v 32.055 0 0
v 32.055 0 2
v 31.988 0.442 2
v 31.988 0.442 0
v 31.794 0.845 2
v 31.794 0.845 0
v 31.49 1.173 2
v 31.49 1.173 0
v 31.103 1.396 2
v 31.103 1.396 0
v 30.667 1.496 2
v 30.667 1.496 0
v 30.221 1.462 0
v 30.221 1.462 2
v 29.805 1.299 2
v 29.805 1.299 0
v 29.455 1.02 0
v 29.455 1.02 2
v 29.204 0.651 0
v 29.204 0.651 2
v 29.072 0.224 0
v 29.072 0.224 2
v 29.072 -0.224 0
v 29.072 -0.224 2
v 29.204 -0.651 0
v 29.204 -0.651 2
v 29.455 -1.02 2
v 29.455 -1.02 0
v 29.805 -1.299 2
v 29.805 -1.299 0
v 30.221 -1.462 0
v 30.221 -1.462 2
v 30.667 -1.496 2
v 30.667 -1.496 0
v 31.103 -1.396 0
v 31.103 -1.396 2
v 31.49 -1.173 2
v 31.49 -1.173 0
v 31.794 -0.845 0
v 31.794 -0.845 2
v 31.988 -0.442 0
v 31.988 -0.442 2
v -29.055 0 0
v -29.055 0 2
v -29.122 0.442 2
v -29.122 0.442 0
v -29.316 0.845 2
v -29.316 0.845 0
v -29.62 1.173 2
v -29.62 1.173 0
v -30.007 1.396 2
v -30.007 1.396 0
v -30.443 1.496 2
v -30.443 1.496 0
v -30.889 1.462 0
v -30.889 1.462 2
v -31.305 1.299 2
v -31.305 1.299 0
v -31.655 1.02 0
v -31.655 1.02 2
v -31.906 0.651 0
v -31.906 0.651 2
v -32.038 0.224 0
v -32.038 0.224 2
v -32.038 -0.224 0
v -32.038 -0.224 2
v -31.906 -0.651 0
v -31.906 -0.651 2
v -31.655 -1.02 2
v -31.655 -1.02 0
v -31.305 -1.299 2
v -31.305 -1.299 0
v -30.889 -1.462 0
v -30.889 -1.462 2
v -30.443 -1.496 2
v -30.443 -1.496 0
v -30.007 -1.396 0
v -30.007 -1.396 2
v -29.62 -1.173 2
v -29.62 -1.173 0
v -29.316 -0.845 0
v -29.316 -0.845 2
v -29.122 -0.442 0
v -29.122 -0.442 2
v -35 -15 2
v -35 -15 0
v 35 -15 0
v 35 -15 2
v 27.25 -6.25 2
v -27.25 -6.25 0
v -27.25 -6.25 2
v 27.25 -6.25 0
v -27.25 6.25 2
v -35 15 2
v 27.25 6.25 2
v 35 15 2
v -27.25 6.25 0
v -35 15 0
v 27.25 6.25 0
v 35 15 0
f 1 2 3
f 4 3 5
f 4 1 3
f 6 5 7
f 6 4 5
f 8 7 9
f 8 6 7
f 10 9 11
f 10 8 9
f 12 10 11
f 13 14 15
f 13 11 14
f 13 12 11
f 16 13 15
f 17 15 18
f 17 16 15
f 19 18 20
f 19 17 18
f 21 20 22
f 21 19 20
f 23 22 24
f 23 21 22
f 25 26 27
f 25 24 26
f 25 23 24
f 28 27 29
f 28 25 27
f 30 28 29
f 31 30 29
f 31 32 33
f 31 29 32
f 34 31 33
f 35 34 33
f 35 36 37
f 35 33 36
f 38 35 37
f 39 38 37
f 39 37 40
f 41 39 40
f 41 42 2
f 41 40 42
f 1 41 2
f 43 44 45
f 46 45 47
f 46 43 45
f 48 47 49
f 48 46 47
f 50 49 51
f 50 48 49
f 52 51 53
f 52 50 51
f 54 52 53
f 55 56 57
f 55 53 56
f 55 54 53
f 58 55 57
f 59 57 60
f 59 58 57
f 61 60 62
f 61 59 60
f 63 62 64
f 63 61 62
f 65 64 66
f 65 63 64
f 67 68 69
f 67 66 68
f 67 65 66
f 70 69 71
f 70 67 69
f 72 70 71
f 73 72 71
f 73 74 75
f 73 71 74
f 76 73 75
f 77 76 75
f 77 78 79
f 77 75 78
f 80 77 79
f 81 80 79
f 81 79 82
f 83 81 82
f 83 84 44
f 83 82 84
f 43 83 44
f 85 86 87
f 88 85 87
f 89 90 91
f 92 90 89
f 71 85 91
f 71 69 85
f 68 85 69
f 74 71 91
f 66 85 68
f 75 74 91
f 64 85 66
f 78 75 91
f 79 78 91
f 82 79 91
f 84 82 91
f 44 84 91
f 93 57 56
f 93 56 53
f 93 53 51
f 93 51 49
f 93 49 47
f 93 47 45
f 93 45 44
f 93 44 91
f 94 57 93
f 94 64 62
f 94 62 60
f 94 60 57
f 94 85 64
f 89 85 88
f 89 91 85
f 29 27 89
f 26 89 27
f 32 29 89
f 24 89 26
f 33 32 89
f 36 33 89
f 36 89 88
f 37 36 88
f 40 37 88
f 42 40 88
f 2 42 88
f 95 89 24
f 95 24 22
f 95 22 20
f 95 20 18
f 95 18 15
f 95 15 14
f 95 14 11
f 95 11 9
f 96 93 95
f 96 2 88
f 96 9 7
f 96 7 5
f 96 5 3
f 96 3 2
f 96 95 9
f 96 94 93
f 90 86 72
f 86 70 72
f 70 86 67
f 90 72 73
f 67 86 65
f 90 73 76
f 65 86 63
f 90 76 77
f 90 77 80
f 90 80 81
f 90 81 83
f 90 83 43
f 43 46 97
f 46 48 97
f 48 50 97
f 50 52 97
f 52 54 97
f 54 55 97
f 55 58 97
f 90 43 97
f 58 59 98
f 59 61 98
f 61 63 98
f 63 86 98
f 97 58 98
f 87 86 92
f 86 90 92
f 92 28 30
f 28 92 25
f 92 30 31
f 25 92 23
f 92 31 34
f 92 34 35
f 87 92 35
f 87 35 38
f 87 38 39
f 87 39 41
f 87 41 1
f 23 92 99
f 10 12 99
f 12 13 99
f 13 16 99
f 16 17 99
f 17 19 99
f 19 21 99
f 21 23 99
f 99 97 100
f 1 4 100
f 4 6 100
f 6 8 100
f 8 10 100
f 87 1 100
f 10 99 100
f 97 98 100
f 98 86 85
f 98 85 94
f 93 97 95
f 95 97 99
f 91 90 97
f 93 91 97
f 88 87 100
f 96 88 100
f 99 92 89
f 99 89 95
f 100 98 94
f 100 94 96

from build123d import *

# Parameters (mm, degrees)
SKETCH_W     = 70
SKETCH_H     = 30
PAD_DEPTH    = 2
SKETCH001_R  = 1.5
SKETCH001_W  = 54.5
SKETCH001_H  = 12.5
POCKET_DEPTH = 5


with BuildPart() as part:
    # Sketch → Pad (new body)
    with BuildSketch(Plane.XY):
        Rectangle(SKETCH_W, SKETCH_H)
    extrude(amount=PAD_DEPTH)

    # Sketch001 → Pocket (cut)
    with BuildSketch(Plane.XY):
        with Locations((-30.555, 0)):
            Circle(SKETCH001_R)
        with Locations((30.555, 0)):
            Circle(SKETCH001_R)
        Rectangle(SKETCH001_W, SKETCH001_H)
    extrude(amount=POCKET_DEPTH, mode=Mode.SUBTRACT)


solid = part.part
